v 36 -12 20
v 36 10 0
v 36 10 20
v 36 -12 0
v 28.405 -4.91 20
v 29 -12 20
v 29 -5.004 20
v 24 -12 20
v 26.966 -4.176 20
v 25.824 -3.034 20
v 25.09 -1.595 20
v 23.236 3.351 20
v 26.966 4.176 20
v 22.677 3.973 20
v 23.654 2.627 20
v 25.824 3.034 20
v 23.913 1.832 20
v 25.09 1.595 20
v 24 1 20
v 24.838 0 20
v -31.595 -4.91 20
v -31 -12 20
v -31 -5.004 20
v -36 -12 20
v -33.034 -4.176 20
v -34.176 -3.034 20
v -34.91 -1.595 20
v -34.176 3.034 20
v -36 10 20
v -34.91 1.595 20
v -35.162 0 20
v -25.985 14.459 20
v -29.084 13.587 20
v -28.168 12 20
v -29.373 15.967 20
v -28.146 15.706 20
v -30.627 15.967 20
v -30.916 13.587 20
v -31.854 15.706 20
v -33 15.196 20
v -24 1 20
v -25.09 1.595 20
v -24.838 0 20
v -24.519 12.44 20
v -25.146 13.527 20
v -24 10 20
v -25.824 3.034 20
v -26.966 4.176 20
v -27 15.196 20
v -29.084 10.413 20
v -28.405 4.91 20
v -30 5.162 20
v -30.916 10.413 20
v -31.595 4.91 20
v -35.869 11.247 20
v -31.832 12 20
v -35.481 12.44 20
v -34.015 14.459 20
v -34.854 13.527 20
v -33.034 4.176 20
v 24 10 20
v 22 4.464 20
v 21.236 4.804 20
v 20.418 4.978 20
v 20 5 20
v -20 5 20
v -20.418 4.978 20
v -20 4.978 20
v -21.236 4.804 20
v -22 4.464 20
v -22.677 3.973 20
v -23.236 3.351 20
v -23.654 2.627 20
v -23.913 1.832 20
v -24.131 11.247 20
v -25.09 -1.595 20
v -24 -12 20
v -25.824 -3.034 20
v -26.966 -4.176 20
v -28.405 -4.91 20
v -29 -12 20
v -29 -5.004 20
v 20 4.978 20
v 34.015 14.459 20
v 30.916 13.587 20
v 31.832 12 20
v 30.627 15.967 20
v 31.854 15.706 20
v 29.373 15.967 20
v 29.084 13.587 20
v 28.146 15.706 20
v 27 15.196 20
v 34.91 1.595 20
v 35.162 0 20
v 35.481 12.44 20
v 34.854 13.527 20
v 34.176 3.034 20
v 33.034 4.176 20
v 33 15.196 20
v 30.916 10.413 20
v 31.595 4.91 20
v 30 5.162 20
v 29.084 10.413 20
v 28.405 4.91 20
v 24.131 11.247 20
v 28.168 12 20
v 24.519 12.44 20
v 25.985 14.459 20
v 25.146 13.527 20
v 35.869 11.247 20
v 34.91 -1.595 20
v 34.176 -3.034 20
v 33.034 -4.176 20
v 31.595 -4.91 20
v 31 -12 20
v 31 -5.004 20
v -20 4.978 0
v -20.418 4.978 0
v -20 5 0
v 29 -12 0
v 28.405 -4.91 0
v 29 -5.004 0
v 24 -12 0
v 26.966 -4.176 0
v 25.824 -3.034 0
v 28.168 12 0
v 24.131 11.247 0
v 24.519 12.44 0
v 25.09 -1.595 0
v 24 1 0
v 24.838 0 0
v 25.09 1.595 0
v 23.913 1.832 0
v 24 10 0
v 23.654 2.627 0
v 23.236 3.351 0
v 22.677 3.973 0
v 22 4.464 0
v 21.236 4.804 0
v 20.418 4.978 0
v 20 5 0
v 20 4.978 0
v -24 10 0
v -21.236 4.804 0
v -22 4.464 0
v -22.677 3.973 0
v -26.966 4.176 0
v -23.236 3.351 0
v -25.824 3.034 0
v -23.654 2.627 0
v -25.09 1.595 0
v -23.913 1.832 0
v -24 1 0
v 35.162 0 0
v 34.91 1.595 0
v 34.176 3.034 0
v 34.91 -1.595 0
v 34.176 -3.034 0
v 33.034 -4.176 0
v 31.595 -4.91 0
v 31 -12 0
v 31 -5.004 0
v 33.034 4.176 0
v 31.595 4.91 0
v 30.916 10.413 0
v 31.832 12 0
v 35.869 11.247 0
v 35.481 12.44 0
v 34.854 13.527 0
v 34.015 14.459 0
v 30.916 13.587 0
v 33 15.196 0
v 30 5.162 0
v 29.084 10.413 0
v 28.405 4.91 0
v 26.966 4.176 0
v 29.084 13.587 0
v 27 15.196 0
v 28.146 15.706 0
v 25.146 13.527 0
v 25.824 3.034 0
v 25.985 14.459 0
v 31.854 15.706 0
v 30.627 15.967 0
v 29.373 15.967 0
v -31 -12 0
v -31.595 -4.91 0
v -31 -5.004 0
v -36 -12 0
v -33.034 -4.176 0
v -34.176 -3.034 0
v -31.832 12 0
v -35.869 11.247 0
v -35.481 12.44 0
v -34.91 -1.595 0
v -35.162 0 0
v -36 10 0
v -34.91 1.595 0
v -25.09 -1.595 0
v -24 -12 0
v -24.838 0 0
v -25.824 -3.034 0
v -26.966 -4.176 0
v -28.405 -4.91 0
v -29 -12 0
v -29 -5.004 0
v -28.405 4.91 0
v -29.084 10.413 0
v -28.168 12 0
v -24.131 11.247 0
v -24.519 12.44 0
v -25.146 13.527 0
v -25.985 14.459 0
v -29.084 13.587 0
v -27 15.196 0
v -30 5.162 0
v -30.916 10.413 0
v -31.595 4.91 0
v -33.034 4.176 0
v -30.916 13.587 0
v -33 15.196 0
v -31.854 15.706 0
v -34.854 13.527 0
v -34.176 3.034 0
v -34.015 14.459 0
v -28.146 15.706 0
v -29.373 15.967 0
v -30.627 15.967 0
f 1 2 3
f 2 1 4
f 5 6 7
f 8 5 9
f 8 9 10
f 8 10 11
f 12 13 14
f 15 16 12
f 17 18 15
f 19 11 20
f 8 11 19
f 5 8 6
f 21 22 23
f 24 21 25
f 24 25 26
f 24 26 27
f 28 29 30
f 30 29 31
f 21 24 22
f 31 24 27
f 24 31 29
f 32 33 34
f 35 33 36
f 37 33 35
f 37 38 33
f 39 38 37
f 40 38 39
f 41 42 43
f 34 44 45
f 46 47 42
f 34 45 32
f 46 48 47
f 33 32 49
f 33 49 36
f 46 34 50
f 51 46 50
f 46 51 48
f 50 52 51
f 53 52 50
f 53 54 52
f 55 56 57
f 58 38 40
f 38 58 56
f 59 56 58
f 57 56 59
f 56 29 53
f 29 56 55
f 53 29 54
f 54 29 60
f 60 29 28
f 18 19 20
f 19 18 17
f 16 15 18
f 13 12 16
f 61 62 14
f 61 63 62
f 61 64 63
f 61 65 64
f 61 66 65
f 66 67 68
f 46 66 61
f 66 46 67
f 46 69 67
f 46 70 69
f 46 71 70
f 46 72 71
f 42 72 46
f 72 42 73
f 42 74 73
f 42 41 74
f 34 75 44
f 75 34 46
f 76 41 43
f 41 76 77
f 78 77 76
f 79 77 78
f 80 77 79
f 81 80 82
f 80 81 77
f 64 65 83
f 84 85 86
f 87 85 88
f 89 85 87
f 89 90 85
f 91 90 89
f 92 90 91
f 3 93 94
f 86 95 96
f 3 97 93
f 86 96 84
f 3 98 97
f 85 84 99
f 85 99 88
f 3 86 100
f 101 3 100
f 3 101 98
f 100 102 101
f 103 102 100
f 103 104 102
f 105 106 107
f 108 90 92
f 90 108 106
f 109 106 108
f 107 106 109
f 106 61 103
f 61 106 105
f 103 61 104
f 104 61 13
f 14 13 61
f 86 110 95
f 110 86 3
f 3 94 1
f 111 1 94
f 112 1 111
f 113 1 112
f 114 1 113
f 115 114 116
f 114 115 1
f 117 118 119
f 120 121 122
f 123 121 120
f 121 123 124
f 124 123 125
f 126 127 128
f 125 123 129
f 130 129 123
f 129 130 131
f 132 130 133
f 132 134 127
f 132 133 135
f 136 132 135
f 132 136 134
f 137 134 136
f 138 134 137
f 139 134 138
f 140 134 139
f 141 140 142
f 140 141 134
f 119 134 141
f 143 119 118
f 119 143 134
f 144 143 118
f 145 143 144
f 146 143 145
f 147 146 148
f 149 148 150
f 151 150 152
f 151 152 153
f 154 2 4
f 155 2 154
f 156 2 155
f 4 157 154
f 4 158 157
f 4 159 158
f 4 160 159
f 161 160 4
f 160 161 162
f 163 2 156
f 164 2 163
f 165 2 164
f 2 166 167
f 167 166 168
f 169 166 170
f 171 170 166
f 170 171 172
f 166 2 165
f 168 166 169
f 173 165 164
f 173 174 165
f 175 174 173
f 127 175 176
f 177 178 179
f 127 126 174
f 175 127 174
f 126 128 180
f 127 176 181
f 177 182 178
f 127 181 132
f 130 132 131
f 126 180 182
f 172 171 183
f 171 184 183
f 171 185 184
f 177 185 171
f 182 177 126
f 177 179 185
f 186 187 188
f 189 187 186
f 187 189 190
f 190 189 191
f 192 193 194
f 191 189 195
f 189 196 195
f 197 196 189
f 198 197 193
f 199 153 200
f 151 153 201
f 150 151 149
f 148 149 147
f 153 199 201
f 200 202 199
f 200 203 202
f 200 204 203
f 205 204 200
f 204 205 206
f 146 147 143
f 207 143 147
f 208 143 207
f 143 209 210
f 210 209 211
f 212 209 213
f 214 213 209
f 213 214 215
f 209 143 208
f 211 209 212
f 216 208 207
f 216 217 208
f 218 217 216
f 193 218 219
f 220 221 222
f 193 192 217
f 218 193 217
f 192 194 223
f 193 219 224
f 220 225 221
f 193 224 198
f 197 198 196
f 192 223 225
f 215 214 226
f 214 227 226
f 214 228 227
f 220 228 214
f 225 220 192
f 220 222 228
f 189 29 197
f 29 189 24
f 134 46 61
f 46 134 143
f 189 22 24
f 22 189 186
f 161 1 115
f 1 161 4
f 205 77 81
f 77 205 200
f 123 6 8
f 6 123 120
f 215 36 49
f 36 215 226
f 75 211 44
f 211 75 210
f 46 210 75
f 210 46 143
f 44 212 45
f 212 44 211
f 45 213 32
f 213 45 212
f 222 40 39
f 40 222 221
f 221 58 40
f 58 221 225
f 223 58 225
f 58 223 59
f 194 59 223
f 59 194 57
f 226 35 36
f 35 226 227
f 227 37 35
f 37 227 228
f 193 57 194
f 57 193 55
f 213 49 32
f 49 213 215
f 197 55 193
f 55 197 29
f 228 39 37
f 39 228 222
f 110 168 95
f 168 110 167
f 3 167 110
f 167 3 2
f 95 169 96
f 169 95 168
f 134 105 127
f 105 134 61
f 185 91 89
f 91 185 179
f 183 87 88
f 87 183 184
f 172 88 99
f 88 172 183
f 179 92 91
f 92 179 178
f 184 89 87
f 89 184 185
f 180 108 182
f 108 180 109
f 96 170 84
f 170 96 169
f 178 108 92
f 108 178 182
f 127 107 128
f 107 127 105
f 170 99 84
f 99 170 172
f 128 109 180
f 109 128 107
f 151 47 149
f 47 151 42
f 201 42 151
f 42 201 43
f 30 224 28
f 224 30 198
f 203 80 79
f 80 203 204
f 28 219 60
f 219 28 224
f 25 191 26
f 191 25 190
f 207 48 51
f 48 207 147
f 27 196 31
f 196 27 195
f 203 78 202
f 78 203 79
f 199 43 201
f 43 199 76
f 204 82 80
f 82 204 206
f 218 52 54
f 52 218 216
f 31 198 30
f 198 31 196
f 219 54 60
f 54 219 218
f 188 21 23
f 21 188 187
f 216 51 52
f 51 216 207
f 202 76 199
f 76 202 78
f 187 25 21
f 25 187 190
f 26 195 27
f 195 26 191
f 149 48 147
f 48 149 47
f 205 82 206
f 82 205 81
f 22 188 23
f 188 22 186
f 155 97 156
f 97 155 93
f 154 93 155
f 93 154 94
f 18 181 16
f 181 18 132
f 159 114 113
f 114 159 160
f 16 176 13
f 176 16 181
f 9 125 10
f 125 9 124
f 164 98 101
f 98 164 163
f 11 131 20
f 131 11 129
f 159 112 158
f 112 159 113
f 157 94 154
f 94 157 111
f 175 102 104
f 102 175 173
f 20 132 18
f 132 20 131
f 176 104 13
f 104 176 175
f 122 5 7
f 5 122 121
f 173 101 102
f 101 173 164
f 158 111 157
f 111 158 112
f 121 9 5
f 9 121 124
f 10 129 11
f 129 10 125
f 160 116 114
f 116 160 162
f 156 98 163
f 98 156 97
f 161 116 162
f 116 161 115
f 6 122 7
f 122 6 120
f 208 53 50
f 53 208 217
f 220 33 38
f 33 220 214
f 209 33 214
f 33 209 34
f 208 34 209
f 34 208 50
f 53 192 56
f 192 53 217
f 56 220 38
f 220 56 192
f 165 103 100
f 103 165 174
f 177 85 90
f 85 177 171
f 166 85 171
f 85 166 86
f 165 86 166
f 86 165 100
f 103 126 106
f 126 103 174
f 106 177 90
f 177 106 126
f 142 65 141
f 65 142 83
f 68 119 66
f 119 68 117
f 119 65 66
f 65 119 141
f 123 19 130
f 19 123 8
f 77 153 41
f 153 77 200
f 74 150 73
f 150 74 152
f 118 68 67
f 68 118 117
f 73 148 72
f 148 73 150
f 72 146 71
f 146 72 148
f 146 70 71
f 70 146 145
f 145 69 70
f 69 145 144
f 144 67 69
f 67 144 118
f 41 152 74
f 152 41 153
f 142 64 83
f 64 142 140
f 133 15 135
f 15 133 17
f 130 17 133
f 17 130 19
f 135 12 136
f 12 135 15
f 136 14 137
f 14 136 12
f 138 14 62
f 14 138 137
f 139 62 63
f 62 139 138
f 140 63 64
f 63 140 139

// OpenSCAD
// file: polyholes.scad
//
// Mendel90
//
// GNU GPL v2
// nop.head@gmail.com
// hydraraptor.blogspot.com
//
// See http://hydraraptor.blogspot.com/2011/02/polyholes.html
//
function sides(r) = max(round(4 *r),3);
function corrected_radius(r,n) = 0.1 + r / cos(180 / n);
function corrected_diameter(d) = 0.2 + d / cos(180 / sides(d / 2));

module poly_circle(r, center = false) {
    n = sides(r);
    circle(r = corrected_radius(r,n), $fn = n, center = center);
}

module poly_cylinder(r, h, center = false) {
    n = sides(r);
    cylinder(h = h, r = corrected_radius(r,n), $fn = n, center = center);
}

module poly_d_cylinder(r, center = false) {
    n = sides(r);
    r = corrected_radius(r,n);
    cylinder(h = h, r = r, $fn = n, center = center);
    translate([0, -r, 0])
        cube([r, 2 * r, h]);
}
// file: configuration.scad
// Bearing dimensions: ID, OD, W
bearing623 = [3, 10, 4];
bearing624 = [4, 13, 5];
bearing608 = [8, 22, 7];
bearinglm8uu = [8, 15, 25];
bearinglm10uu = [10, 19, 29];

smooth_rod_separation = 60;
//smooth_rod_length = 300; // Rostock mini
//smooth_rod_radius = 4;
//smooth_rod_bearing = bearinglm8uu;
smooth_rod_length = 770;
smooth_rod_radius = 5;
smooth_rod_bearing = bearinglm10uu;

motor_end_height = 44;

idler_end_height = 28;
//idler_bearing = bearing608;
idler_bearing = bearing624;

platform_thickness = 8;
platform_hinge_offset = 33;

bed_thickness = 12;
pcb_thickness = 2;

rod_separation = 50;
//rod_length = 150; // Rostock mini
//rod_radius = 65; // Rostock mini
rod_length = 250;
rod_radius = 124;


carriage_height = smooth_rod_bearing[2];
carriage_hinge_offset = smooth_rod_bearing[1]/2+14.5;
// main file
include <configuration.scad>

$fa = 12;
$fs = 0.5;
use <polyholes.scad>

w = 60; // Smooth rod distance (center to center)

module screws() {
  for (x = [-smooth_rod_separation/2, smooth_rod_separation/2]) {
    translate([x, 0, 0]) {
      // Push-through M3 screw hole.
      translate([0, -6, 0]) rotate([0, 90, 0])
	poly_cylinder(r=1.5, h=20, center=true);
      // M3 nut holder.
      translate([-x/5, -6, 0])
	rotate([30, 0, 0]) rotate([0, 90, 0])
	cylinder(r=3.2, h=2.3, center=true, $fn=6);
    }
  }
}

module bracket(h) {
  difference() {
    union() {
      translate([0, -1, 0]) cube([smooth_rod_separation+12, 22, h], center=true);
      // Sandwich mount.
      translate([-smooth_rod_separation/2, 10, 0]) cylinder(r=6, h=h, center=true);
      translate([smooth_rod_separation/2, 10, 0]) cylinder(r=6, h=h, center=true);
    }
    // Sandwich mount.
    translate([-smooth_rod_separation/2, 12, 0]) poly_cylinder(r=1.5, h=h+1, center=true);
    translate([smooth_rod_separation/2, 12, 0]) poly_cylinder(r=1.5, h=h+1, center=true);
    // Smooth rod mounting slots.
    for (x = [-smooth_rod_separation/2, smooth_rod_separation/2]) {
      translate([x, 0, 0]) {
	poly_cylinder(r=smooth_rod_radius, h=h+1, center=true);
	translate([0, -10, 0]) cube([2, 20, h+1], center=true);
      }
    }
    // Belt path.
    translate([0, -5, 0]) cube([smooth_rod_separation-20, 20, h+1], center=true);
    translate([0, -9, 0]) cube([smooth_rod_separation-12, 20, h+1], center=true);
    translate([-smooth_rod_separation/2+10, 1, 0]) cylinder(r=4, h=h+1, center=true);
    translate([smooth_rod_separation/2-10, 1, 0]) cylinder(r=4, h=h+1, center=true);
  }
}

translate([0, 0, 10]) bracket(20);
